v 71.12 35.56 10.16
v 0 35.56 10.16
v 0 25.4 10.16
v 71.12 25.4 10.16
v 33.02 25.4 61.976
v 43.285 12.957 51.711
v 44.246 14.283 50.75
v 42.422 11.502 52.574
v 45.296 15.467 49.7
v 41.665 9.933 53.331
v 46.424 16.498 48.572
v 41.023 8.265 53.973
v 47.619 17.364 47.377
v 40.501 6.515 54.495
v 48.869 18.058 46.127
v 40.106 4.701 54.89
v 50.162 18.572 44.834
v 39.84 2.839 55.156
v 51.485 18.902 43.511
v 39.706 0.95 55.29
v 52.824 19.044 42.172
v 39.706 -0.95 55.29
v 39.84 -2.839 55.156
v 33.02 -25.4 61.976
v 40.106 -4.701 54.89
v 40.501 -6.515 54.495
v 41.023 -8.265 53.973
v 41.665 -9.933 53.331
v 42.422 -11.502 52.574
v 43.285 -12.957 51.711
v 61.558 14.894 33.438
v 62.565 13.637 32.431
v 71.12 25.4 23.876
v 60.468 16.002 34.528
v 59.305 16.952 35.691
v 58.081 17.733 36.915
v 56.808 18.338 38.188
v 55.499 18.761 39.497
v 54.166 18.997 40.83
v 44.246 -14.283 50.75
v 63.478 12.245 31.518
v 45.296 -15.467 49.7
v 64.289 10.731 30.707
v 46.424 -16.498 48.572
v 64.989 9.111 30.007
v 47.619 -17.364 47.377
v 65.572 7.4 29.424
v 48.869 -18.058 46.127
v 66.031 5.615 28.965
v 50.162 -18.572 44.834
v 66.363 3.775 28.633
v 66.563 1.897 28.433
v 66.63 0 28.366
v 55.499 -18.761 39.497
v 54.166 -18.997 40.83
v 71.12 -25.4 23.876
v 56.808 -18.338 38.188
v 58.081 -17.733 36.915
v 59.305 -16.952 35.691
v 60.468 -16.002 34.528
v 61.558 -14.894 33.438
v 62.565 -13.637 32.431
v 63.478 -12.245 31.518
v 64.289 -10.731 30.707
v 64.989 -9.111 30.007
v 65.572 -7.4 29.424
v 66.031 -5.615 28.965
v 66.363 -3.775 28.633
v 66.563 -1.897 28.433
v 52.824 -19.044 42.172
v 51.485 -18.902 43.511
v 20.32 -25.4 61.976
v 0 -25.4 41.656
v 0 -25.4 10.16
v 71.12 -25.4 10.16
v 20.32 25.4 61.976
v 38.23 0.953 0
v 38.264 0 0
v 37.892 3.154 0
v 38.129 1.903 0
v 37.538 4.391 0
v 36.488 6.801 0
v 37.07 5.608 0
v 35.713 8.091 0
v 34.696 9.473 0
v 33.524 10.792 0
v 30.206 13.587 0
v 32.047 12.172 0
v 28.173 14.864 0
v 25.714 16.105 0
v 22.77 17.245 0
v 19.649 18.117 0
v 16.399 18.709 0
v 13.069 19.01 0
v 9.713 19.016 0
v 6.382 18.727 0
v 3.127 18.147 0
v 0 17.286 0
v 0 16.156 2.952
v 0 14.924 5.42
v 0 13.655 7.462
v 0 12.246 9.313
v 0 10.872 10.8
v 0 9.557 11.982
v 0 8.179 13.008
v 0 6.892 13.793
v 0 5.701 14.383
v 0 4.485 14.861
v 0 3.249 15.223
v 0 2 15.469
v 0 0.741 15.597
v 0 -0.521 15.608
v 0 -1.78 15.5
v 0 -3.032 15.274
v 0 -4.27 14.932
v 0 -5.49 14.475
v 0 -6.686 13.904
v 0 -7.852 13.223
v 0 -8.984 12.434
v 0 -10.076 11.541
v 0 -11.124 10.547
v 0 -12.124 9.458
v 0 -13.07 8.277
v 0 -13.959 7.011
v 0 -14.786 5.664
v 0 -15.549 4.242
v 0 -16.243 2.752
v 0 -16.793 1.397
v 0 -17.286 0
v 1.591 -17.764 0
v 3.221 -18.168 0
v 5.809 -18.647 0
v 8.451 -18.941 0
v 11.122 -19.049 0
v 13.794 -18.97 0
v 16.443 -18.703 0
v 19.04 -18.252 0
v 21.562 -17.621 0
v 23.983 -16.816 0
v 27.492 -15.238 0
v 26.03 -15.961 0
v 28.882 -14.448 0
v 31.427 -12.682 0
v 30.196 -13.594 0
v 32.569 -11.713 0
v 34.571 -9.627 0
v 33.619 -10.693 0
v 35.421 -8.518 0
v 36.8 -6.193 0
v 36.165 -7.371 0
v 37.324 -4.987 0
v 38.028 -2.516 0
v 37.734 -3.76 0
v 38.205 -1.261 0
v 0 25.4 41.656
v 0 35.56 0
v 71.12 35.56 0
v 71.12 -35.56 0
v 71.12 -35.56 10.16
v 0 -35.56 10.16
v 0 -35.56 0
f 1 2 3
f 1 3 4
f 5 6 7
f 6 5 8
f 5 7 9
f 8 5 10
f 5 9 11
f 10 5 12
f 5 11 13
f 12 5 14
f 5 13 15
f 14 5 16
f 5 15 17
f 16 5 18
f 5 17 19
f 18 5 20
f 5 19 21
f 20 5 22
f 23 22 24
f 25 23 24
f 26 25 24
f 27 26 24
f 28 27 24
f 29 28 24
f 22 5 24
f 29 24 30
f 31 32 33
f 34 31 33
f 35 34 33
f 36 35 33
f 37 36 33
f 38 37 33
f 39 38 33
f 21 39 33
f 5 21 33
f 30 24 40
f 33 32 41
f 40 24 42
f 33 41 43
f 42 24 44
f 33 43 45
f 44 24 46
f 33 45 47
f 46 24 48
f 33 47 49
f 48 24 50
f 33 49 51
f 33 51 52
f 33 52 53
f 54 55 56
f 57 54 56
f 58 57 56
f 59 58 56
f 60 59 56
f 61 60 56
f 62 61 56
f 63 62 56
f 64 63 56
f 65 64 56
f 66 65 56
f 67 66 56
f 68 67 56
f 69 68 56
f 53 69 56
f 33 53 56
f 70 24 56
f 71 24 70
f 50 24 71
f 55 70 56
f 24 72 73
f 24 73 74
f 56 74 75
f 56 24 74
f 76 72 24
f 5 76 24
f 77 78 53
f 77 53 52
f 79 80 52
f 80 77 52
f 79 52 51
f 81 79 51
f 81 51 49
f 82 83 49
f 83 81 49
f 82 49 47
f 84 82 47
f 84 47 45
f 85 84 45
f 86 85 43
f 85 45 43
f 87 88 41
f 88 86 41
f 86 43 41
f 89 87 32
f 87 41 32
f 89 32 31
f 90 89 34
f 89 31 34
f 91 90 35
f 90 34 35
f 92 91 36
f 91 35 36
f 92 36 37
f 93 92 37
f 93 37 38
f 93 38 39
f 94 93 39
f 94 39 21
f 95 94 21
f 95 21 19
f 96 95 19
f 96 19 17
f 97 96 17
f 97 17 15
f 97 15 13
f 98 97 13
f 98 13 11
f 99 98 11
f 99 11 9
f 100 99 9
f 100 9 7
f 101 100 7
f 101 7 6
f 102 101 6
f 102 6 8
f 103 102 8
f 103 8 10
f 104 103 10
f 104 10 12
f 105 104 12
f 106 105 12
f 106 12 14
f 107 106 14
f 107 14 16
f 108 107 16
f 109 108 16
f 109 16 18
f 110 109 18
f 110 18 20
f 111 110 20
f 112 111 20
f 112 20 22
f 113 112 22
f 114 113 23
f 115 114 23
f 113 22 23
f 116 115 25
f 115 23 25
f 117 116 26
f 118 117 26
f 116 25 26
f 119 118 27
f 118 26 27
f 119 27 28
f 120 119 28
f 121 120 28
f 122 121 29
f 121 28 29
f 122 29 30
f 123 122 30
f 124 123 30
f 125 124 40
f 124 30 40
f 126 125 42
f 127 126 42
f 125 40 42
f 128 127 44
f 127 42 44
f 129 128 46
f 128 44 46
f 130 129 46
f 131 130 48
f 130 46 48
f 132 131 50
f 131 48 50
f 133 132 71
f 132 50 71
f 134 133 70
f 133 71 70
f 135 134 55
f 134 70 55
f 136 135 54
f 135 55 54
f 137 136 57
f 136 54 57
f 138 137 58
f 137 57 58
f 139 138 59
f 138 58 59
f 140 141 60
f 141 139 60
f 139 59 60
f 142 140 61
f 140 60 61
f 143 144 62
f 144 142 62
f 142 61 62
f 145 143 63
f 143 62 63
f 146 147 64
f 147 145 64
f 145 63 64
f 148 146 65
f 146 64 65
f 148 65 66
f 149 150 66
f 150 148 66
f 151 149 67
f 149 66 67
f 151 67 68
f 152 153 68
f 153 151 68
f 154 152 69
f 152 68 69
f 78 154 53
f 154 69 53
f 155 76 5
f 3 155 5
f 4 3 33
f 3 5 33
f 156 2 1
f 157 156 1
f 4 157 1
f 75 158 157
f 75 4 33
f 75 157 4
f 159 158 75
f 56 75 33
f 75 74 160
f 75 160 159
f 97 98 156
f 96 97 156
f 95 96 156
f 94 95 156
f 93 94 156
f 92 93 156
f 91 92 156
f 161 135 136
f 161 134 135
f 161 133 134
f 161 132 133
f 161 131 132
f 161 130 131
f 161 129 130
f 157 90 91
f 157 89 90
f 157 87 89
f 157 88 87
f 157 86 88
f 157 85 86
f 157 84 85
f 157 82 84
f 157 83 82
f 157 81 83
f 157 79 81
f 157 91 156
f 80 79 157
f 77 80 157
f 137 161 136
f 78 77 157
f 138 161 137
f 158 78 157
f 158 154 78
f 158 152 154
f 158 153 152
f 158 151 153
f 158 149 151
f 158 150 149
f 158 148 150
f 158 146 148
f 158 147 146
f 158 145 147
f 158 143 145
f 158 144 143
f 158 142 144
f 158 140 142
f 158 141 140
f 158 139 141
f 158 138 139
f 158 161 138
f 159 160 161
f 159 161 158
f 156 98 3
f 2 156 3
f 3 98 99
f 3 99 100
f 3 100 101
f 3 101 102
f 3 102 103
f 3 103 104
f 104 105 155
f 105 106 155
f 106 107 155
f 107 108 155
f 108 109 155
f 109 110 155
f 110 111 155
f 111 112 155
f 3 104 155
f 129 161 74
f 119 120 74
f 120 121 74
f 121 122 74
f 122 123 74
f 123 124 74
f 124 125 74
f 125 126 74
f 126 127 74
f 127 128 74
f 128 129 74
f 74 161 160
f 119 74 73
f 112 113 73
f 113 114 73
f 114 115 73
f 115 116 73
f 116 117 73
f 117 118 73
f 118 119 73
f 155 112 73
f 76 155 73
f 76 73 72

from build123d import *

# Parameters (mm, degrees)
F0_W     = 71.12
F0_H     = 61.976
F1_DEPTH = 35.56
F2_W     = 71.12
F2_H     = 10.16
F3_DEPTH = 51.816
F5_DEPTH = 60.961
F6_R     = 19.05
F7_DEPTH = 67.173316


with BuildPart() as f1:
    # F0 (on Front) → F1 (new body, symmetric)
    with BuildSketch(Plane.XZ):
        with Locations((35.56, 30.988)):
            Rectangle(F0_W, F0_H)
    extrude(amount=F1_DEPTH, both=True)

    # F2 (on face) → F3 (cut)
    with BuildSketch(Plane.XY.offset(61.976)):
        with Locations((35.56, -30.48)):
            Rectangle(F2_W, F2_H)
        with Locations((35.56, 30.48)):
            Rectangle(F2_W, F2_H)
    extrude(amount=-F3_DEPTH, mode=Mode.SUBTRACT)

    # F4 (on face) → F5 (cut, through all)
    with BuildSketch(Plane.XZ.offset(25.4)):
        Polygon((0, 61.976), (0, 41.656), (20.32, 61.976), align=None)
        Polygon((71.12, 61.976), (33.02, 61.976), (71.12, 23.876), align=None)
    extrude(amount=-F5_DEPTH, mode=Mode.SUBTRACT)

    # F6 (on face) → F7 (cut, through all)
    with BuildSketch(Plane(origin=(47.498, 0, 47.498), x_dir=(0.707107, 0, -0.707107), z_dir=(0.707107, 0, 0.707107))):
        with Locations((8.006553, 0)):
            Circle(F6_R)
    extrude(amount=-F7_DEPTH, mode=Mode.SUBTRACT)


solid = f1.part
